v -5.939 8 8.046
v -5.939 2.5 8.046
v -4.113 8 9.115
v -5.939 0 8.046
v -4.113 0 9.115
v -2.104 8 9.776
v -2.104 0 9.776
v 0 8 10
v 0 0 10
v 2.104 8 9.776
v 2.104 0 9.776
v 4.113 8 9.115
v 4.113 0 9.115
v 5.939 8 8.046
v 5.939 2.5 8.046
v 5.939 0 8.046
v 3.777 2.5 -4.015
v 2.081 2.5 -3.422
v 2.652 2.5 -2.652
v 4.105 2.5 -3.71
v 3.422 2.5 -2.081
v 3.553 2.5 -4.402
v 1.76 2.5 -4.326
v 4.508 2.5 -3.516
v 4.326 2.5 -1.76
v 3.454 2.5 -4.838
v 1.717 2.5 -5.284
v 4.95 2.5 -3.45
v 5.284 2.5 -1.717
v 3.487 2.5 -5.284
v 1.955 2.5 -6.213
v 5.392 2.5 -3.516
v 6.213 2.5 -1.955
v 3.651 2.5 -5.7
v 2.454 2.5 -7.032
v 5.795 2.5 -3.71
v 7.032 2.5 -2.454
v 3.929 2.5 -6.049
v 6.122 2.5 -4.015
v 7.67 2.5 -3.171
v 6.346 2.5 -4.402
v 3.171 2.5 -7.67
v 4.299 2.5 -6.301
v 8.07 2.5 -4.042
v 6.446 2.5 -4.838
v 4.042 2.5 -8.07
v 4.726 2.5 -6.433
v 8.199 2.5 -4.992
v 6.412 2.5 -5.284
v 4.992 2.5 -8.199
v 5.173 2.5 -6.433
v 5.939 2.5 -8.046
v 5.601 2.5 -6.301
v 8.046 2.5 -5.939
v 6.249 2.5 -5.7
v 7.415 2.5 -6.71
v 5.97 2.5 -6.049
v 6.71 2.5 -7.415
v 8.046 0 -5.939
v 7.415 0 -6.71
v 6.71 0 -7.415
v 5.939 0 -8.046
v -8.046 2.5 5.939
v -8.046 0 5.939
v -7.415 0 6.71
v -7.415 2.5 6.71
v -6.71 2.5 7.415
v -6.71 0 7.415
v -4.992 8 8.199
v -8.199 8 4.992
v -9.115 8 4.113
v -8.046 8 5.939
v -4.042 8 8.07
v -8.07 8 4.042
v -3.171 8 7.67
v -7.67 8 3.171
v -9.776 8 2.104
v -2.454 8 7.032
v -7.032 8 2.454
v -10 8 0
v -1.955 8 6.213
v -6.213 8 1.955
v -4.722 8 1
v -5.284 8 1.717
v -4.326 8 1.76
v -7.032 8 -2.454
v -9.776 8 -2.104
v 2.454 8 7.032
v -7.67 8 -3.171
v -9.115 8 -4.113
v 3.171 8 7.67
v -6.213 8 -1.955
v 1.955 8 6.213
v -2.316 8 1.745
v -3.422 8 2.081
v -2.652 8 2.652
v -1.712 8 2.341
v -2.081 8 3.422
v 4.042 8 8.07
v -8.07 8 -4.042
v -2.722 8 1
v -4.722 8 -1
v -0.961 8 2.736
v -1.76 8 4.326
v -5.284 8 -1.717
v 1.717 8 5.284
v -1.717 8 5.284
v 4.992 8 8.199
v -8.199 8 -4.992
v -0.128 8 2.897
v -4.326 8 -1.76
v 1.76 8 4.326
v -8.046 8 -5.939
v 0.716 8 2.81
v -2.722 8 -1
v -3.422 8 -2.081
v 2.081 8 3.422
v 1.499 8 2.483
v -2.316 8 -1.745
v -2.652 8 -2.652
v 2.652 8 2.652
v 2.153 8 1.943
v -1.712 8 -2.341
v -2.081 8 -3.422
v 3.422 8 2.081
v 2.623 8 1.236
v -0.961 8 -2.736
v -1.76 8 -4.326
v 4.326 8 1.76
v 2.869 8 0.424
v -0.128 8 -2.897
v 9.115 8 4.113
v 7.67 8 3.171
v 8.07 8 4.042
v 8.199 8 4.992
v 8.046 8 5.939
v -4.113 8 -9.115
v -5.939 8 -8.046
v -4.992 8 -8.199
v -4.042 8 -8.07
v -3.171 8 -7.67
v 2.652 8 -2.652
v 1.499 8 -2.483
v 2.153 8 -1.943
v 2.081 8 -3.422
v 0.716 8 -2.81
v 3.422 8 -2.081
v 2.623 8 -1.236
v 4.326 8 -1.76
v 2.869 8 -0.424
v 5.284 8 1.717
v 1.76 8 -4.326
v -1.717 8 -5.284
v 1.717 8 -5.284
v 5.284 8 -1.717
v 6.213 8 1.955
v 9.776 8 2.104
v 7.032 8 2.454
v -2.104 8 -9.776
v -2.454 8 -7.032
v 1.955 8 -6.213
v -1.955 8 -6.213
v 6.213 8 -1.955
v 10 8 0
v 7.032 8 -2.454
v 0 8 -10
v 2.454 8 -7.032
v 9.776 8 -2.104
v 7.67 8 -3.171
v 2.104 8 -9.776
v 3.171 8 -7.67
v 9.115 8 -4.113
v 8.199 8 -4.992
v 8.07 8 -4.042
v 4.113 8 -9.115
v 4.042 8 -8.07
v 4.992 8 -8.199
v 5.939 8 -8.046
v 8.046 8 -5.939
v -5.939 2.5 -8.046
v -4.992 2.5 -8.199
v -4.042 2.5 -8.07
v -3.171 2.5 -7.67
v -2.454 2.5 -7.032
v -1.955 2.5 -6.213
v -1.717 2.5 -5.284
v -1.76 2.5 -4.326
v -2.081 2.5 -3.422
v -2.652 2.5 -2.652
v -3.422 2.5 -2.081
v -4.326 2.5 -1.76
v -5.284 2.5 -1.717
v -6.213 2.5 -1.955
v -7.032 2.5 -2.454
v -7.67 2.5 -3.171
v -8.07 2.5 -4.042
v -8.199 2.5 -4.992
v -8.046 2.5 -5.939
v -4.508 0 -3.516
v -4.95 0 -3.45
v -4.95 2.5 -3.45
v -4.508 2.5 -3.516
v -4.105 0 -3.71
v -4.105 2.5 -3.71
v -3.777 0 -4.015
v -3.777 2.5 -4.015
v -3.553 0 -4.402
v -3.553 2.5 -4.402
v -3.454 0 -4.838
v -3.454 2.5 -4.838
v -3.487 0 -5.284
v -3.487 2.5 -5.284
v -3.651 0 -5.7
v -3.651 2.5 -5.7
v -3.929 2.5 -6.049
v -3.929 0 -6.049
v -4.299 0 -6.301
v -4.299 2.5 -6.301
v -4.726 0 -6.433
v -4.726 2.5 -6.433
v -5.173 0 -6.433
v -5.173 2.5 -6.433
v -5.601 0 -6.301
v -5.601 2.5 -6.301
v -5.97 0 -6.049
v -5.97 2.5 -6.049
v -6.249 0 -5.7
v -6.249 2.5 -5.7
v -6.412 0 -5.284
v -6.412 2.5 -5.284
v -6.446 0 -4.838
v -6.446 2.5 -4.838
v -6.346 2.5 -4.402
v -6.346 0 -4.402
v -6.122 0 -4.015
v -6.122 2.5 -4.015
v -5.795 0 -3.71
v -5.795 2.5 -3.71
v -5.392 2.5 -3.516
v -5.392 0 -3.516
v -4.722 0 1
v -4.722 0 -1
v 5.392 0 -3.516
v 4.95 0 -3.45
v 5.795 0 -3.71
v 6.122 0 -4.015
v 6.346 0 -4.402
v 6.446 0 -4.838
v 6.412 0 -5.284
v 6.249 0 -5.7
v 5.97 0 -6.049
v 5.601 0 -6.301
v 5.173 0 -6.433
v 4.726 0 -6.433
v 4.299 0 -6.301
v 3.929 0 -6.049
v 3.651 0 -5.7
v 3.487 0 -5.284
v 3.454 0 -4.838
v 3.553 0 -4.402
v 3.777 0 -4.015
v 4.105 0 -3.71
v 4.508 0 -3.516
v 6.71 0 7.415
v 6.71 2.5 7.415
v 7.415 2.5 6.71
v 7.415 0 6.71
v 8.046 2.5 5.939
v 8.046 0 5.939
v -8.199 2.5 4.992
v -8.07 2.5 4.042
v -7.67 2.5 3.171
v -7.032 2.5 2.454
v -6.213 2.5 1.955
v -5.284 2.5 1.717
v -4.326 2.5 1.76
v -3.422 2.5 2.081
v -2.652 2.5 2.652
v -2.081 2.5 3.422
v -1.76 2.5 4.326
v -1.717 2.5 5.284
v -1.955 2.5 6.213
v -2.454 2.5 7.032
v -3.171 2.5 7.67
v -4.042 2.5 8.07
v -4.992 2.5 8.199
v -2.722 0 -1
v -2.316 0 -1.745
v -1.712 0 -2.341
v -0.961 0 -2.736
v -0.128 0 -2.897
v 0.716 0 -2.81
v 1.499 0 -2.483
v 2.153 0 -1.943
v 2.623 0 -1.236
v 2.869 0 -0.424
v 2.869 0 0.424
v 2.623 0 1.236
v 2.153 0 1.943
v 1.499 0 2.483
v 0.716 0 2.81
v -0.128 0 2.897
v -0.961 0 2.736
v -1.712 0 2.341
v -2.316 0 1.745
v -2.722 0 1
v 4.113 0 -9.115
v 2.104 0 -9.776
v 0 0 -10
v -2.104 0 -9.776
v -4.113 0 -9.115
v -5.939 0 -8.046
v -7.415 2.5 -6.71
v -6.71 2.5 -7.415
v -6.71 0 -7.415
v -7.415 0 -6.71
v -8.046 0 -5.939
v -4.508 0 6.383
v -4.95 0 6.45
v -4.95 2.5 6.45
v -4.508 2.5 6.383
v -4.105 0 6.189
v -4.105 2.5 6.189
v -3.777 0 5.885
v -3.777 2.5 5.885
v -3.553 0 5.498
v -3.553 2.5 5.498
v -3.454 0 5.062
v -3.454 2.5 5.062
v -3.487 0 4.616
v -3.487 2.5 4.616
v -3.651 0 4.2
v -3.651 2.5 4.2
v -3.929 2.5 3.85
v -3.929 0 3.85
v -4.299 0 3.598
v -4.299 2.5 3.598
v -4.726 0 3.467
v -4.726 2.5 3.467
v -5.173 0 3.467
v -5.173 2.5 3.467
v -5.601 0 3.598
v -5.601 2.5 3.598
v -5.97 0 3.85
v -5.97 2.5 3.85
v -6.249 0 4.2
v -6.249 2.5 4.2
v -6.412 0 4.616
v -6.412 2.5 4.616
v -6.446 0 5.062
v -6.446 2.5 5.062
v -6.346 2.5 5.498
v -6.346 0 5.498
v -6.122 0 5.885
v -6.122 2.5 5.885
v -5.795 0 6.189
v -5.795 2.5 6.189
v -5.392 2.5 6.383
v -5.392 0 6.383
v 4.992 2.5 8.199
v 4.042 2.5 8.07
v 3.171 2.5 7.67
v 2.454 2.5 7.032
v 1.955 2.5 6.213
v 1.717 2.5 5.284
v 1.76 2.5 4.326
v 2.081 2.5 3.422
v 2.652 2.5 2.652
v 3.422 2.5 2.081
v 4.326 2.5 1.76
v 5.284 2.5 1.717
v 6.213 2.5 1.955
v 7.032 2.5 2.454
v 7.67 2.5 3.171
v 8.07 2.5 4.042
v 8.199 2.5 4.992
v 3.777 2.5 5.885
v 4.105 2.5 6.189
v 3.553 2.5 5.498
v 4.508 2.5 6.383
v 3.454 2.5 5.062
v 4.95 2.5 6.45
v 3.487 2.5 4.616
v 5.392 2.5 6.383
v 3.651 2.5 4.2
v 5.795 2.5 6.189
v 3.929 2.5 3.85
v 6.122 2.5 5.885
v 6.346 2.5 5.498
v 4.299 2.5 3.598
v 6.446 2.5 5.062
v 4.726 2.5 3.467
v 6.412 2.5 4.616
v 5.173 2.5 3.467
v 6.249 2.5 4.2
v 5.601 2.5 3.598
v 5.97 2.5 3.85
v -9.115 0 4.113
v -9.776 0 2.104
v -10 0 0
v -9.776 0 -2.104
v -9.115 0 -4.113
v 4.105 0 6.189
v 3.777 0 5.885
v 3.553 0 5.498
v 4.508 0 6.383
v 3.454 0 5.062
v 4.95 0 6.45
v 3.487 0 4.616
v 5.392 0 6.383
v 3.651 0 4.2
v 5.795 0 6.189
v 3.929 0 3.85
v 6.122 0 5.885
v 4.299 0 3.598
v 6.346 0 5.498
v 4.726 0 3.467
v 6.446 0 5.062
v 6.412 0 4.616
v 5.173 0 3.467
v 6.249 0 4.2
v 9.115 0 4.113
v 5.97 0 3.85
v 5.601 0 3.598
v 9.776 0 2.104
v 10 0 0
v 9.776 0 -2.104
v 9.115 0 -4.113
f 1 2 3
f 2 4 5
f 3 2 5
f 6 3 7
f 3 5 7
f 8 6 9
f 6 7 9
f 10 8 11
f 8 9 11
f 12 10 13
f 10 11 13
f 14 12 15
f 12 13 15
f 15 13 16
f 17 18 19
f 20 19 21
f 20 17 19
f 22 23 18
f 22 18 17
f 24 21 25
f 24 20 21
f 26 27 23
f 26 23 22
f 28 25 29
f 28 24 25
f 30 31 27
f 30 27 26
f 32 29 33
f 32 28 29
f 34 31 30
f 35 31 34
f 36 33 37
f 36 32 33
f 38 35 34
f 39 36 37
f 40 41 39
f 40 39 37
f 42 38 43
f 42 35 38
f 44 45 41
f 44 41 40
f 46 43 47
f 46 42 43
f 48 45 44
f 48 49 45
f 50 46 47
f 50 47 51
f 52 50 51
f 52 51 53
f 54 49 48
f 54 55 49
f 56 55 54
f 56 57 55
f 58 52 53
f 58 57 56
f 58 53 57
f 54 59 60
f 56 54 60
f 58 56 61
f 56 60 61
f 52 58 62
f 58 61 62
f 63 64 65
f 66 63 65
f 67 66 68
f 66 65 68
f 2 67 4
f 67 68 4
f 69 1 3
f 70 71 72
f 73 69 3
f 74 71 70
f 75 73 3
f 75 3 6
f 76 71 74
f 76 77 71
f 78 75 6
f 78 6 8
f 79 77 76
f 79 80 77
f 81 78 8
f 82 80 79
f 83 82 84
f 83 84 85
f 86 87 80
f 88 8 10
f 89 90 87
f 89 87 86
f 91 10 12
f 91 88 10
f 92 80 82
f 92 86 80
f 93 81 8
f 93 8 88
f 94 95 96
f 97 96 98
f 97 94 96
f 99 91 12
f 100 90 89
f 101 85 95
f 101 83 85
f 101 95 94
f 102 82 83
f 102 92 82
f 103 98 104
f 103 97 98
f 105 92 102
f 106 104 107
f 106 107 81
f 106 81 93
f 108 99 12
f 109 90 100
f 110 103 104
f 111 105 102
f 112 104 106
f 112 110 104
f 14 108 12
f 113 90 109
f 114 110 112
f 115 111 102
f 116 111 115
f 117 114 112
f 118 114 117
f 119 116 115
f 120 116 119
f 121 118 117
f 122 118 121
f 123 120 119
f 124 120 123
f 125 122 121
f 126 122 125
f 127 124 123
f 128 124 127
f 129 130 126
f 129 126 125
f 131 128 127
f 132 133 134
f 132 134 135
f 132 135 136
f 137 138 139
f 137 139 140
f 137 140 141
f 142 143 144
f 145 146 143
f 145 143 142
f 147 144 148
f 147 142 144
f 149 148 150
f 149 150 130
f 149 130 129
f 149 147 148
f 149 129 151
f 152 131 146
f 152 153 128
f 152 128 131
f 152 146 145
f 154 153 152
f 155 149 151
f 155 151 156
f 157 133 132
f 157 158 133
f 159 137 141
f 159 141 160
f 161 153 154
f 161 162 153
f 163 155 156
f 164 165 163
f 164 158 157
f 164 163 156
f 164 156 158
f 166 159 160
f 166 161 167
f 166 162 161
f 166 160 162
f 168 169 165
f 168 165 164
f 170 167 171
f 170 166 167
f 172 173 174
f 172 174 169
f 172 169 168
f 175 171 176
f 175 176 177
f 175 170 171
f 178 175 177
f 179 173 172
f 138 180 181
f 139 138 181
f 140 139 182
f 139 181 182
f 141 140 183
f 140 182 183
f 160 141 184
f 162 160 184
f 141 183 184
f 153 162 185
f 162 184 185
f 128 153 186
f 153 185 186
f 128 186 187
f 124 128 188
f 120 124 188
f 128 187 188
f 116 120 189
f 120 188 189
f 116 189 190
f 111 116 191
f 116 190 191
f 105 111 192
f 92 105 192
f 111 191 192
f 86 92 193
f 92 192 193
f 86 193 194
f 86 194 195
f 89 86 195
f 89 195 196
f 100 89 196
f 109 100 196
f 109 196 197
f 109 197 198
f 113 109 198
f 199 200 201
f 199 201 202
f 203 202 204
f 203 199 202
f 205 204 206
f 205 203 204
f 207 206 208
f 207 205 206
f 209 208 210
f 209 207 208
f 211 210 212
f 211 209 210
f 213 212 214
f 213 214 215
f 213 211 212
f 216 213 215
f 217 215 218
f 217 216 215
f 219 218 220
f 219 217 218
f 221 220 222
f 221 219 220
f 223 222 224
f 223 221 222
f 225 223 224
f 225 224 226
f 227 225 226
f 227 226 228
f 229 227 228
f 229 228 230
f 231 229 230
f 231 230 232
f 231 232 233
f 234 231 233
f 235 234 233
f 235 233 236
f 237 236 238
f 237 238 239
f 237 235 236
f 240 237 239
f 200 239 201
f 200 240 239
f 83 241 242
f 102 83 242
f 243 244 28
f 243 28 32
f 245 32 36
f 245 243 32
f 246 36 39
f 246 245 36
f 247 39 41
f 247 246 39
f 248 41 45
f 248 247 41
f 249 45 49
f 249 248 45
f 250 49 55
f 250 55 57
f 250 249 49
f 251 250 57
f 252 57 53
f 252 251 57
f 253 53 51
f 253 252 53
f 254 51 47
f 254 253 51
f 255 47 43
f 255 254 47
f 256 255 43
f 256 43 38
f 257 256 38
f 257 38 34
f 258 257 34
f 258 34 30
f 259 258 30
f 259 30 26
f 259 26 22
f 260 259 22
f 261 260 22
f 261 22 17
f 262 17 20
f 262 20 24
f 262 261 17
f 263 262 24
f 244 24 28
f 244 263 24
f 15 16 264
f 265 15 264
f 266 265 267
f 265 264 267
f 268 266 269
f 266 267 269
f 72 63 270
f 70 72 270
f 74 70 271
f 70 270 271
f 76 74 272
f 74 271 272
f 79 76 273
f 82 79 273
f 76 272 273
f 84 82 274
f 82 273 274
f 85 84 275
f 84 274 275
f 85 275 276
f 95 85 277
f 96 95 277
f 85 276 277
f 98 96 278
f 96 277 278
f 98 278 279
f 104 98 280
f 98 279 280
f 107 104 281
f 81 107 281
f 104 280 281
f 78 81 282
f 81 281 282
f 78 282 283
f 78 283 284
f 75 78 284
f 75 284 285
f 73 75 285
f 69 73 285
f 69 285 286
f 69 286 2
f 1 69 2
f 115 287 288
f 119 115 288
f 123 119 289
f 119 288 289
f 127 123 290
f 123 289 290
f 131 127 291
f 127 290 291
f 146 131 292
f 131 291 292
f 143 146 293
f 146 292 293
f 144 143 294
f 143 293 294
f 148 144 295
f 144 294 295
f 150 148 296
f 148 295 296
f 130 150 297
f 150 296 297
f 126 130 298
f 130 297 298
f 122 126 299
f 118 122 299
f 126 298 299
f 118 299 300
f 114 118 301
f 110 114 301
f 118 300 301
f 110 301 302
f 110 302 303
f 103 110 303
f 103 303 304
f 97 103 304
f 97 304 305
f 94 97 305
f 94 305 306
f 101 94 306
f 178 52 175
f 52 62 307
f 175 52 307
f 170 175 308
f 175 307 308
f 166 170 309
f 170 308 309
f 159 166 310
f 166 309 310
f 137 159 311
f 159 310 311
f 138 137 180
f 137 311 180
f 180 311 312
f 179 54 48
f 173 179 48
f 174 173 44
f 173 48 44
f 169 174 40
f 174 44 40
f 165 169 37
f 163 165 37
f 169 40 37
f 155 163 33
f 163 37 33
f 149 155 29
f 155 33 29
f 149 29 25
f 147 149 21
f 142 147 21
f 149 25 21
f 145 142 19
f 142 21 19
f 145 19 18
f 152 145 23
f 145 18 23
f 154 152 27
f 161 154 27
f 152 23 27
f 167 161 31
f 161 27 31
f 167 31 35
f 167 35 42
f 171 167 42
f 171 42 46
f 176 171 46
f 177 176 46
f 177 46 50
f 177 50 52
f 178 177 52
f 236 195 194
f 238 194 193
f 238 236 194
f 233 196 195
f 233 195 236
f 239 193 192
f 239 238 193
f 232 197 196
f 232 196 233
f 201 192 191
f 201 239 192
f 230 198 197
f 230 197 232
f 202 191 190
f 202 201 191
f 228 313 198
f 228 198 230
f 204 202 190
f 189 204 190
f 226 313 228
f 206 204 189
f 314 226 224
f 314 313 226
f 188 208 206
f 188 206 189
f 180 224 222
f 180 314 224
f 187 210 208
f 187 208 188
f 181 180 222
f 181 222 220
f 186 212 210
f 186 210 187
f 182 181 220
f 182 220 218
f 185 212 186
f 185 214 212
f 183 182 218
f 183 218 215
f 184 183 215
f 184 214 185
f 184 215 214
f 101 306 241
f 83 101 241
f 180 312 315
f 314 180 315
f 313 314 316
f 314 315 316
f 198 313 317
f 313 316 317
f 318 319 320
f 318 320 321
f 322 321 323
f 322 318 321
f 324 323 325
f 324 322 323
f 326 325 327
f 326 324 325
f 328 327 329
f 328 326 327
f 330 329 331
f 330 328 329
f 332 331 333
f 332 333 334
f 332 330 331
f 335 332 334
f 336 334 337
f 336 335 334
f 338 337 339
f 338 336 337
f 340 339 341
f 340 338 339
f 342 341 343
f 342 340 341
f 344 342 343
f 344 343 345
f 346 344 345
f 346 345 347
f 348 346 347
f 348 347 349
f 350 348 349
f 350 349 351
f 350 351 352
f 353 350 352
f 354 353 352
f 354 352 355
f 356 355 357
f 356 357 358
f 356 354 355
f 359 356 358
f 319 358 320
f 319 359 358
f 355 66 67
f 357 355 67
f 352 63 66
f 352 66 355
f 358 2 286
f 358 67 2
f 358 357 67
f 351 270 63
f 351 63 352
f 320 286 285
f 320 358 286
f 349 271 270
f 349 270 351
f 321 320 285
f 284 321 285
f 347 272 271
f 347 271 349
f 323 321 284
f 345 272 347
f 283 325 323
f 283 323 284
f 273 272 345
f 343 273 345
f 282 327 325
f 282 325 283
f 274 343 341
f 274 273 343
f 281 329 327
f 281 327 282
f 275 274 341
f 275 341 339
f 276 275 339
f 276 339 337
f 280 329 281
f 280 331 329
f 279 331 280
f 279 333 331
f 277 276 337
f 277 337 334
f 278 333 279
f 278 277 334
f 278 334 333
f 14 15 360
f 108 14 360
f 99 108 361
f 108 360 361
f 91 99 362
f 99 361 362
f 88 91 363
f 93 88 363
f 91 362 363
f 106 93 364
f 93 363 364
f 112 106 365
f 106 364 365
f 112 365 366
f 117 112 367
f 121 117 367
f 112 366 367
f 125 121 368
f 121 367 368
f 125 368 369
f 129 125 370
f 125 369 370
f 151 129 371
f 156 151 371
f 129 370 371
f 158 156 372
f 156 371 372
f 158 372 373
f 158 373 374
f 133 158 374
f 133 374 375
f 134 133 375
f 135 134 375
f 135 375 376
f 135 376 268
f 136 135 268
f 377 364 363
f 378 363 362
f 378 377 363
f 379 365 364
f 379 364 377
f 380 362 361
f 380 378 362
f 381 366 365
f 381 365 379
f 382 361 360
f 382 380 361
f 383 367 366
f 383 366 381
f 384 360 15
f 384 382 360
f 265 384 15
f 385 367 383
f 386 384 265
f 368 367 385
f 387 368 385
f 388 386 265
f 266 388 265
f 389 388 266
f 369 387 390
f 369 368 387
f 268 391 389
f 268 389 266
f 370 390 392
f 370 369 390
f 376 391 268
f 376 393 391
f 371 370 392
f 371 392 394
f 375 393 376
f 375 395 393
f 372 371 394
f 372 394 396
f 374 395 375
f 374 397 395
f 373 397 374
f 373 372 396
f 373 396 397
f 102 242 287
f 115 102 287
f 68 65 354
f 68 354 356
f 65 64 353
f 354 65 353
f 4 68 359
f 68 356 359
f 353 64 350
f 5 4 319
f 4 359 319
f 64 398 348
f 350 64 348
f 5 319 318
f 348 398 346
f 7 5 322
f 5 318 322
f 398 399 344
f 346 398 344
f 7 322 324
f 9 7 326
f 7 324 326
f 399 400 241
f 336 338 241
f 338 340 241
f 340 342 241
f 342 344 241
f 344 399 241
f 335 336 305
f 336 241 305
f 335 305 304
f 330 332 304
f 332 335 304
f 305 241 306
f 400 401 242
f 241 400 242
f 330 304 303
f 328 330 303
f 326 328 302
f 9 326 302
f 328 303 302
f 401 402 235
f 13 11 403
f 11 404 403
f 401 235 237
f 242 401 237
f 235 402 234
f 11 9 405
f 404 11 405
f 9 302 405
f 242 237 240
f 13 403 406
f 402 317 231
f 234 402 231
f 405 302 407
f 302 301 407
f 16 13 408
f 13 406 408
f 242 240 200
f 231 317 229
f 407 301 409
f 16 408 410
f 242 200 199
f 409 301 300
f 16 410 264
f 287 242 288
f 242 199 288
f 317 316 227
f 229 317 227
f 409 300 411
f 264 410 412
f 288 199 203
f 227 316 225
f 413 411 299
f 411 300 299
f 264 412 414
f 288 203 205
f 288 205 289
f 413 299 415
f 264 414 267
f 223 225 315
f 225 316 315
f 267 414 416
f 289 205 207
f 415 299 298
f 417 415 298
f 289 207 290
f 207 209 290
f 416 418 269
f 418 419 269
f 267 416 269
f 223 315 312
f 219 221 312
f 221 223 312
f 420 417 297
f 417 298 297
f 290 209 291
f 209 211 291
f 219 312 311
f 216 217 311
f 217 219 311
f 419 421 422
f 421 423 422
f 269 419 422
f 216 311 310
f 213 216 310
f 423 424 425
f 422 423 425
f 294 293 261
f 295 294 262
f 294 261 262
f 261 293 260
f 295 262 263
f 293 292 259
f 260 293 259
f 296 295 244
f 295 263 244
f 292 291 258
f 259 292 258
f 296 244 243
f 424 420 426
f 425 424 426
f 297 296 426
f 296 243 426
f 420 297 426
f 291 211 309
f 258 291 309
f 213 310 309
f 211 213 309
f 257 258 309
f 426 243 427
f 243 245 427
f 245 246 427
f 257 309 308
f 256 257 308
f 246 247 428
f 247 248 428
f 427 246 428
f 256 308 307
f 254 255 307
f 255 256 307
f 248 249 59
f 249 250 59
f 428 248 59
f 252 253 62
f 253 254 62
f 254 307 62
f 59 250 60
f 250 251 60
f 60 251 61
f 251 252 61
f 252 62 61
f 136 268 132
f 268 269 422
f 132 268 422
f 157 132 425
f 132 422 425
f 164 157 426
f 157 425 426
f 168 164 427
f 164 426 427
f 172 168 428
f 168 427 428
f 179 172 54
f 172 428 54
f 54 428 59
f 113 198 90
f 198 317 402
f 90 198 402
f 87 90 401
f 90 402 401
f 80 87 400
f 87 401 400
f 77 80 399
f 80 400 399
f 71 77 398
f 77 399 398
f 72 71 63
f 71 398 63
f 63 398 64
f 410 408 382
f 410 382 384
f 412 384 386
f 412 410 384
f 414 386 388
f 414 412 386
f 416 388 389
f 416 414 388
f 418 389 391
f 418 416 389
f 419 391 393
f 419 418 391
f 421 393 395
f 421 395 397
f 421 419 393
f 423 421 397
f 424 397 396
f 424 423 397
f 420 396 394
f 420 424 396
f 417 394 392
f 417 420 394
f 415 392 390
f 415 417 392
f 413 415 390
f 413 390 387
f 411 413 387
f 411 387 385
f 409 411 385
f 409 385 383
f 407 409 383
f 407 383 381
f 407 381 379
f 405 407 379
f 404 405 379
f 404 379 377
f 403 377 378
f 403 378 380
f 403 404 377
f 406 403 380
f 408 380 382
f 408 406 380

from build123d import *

# Parameters (mm, degrees)
SKETCH1_R           = 10
SKETCH1_R_2         = 1.5
BOSS_EXTRUDE1_DEPTH = 2.5
BOSS_EXTRUDE5_DEPTH = 8


with BuildPart() as part:
    # Sketch1 → Boss-Extrude1 (new body)
    with BuildSketch(Plane(origin=(0, 0, 0), x_dir=(1, 0, 0), z_dir=(0, 1, 0))):
        Circle(SKETCH1_R)
        with Locations((4.949747468, 4.949747468)):
            Circle(SKETCH1_R_2, mode=Mode.SUBTRACT)
        with BuildLine():
            Line((-4.722131518, 1), (-2.722131518, 1))
            ThreePointArc((-2.722131518, 1), (2.9, 0), (-2.722131518, -1))
            Line((-2.722131518, -1), (-4.722131518, -1))
            Line((-4.722131518, -1), (-4.722131518, 1))
        make_face(mode=Mode.SUBTRACT)
        with Locations((4.949747468, -4.949747468)):
            Circle(SKETCH1_R_2, mode=Mode.SUBTRACT)
        with Locations((-4.949747468, -4.949747468)):
            Circle(SKETCH1_R_2, mode=Mode.SUBTRACT)
        with Locations((-4.949747468, 4.949747468)):
            Circle(SKETCH1_R_2, mode=Mode.SUBTRACT)
    extrude(amount=BOSS_EXTRUDE1_DEPTH)

    # Sketch1<14> → Boss-Extrude5 (add)
    with BuildSketch(Plane(origin=(0, 0, 0), x_dir=(1, 0, 0), z_dir=(0, 1, 0))):
        with BuildLine():
            ThreePointArc((8.045640675, -5.938658614), (10, 0), (8.045640675, 5.938658614))
            ThreePointArc((8.045640675, 5.938658614), (2.651650429, 2.651650429), (5.938658614, 8.045640675))
            ThreePointArc((5.938658614, 8.045640675), (0, 10), (-5.938658614, 8.045640675))
            ThreePointArc((-5.938658614, 8.045640675), (-2.651650429, 2.651650429), (-8.045640675, 5.938658614))
            ThreePointArc((-8.045640675, 5.938658614), (-10, 0), (-8.045640675, -5.938658614))
            ThreePointArc((-8.045640675, -5.938658614), (-2.651650429, -2.651650429), (-5.938658614, -8.045640675))
            ThreePointArc((-5.938658614, -8.045640675), (0, -10), (5.938658614, -8.045640675))
            ThreePointArc((5.938658614, -8.045640675), (2.651650429, -2.651650429), (8.045640675, -5.938658614))
        make_face()
        with BuildLine():
            Line((-4.722131518, -1), (-4.722131518, 1))
            Line((-4.722131518, 1), (-2.722131518, 1))
            ThreePointArc((-2.722131518, 1), (2.9, 0), (-2.722131518, -1))
            Line((-2.722131518, -1), (-4.722131518, -1))
        make_face(mode=Mode.SUBTRACT)
    extrude(amount=BOSS_EXTRUDE5_DEPTH)


solid = part.part
